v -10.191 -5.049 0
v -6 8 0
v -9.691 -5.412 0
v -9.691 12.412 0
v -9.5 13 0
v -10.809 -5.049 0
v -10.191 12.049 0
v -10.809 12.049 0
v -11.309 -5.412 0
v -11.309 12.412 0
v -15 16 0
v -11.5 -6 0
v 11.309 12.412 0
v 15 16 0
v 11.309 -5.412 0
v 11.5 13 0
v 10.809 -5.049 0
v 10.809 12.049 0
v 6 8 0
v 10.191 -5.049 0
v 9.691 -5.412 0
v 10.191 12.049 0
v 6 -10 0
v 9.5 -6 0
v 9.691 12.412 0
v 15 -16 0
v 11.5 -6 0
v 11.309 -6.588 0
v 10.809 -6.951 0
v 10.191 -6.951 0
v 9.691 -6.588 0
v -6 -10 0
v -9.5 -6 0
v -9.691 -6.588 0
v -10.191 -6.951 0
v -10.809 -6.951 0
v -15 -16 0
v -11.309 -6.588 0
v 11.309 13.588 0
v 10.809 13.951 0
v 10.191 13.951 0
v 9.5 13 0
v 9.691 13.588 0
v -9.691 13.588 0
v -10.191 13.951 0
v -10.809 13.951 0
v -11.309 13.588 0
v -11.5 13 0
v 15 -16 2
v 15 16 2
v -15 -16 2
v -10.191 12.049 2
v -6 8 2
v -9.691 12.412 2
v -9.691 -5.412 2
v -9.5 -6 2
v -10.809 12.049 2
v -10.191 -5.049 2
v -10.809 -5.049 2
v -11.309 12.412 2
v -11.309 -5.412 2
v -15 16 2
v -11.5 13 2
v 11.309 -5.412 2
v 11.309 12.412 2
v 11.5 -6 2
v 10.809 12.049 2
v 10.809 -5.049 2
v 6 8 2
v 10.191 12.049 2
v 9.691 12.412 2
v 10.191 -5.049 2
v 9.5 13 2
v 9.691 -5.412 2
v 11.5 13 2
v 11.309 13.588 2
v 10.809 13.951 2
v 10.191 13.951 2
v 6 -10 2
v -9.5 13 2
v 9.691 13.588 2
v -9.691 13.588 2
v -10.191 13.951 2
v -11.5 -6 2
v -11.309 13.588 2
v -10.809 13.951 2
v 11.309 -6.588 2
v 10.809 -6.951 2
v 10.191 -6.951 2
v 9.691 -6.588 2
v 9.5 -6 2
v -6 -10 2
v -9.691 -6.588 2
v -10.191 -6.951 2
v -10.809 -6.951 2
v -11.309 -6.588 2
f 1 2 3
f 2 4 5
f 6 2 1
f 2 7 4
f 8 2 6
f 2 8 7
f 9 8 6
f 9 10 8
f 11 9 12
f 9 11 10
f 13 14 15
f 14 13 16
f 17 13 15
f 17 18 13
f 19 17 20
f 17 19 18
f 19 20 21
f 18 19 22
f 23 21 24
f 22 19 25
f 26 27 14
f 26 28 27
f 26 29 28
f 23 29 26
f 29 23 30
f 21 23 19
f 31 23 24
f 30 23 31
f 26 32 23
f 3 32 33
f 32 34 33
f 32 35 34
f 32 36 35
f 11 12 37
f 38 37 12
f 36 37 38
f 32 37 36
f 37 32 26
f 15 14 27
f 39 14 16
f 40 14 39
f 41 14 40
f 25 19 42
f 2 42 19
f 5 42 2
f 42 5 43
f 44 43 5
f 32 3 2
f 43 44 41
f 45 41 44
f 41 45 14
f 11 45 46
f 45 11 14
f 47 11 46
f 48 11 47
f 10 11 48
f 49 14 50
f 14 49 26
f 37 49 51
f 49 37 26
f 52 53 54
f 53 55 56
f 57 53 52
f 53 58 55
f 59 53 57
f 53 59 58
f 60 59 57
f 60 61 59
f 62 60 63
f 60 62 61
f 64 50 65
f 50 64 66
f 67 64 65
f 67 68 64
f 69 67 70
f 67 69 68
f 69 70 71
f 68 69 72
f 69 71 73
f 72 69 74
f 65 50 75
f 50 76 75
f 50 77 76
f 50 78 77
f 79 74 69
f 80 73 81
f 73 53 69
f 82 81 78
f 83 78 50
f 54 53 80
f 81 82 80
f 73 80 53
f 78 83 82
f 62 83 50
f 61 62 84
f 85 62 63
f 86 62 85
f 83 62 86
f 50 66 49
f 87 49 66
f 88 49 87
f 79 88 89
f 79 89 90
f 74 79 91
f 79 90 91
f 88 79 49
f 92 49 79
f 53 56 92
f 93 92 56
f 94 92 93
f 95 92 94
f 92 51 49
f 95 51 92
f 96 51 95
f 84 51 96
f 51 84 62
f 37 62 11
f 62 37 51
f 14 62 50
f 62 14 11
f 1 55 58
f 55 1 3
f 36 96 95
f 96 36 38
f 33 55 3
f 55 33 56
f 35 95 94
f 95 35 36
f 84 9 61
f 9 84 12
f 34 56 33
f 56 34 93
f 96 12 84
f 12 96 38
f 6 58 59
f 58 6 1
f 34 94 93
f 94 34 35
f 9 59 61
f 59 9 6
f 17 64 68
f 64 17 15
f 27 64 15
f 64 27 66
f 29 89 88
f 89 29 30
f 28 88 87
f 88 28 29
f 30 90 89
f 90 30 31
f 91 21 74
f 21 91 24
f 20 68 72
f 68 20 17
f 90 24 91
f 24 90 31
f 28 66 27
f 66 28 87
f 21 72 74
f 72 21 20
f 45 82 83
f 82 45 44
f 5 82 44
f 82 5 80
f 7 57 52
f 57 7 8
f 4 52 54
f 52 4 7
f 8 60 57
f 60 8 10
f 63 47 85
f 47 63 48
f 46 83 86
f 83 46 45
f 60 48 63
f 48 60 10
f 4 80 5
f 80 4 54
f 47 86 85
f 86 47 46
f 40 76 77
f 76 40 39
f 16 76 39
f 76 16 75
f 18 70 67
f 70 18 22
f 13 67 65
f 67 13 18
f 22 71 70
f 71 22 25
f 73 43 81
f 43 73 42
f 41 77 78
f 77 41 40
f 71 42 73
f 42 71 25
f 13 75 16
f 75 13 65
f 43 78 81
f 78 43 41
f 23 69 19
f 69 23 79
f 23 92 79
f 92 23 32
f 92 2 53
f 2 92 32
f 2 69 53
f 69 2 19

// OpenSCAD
/*


    Halterung für Raspi-Kamera in Strahlergehäuse

    14.02.2017  Initial version
    17.12.2017  Variante für kleines Gehäuse
    18.12.2017  Anpassungen und Optimierungen (Dicke, Tiefe)
    
    
*/

// Auflösung anpassen
//
$fn = 40;
$fn = 10;

// Welches Modell?
//
zoom=false;

// Materialstärke
//
dicke = 6;

// Parameter für großes Gehäuse
//
//x_size=81;
//y_size=62.5;
x_size=30;
y_size=32;
tiefe = 25;
skala=2;

// Parameter für kleines Gehäuse
//
/*
x_size=59.5;
y_size=40.5;
tiefe = 5;
skala=2;
*/

module Huelse()
{
    linear_extrude(tiefe, scale = skala, center = true)
    {
        offset(0)
        {
            translate([-x_size/2, -y_size/2, 0])
            square([x_size, y_size], 0);
        }
    }
}

module Innenhuelse()
{
    linear_extrude(tiefe, scale = skala, center = true)
    {
        offset(0)
        {
            translate([(-x_size+dicke)/2, (-y_size+dicke)/2, 0])
            square([x_size-dicke, y_size-dicke], 0);
        }
    }
}

//hoehe=-tiefe/2-2;
hoehe=0;

module Box()
{
    translate([-(x_size)/2, -(y_size)/2, hoehe])
    linear_extrude(2)
    {
        offset(0)
        {
            square([x_size, y_size], 0);
        }
    }
}

module Innenbox()
{
    if (!zoom)
    {
        translate([-(12)/2, -10, hoehe])
        linear_extrude(3)
        {
            offset(0)
            {
                square([12, 18], 0);
            }
        }
    }
}

module Zoomloch()
{
    if (zoom)
    {
     translate([-14/2, -1, hoehe])
    
     linear_extrude(3)
     {
         square([14,14]);
     }

     // Linsenbalken
     //
     translate([-23/2, 3.5, hoehe])
    
     linear_extrude(3)
     {
         square([23,5.5]);
     }
    }
}
module Steckerleiste()
{
    // Unteres Loch für die Steckerleiste
    //
    if (zoom)
    {
     translate([-23/2, -10, hoehe])
    
     linear_extrude(3)
     {
         square([23,7]);
     }
    }
}

module Schraubloecher()
{
    // Untere
    //
    if (!zoom)
    {
        translate([-21/2, -6, hoehe])
    
        linear_extrude(3)
        {
            circle(1);
        }

        translate([+21/2, -6, hoehe])
    
        linear_extrude(3)
        {
            circle(1);
        }
    }
    else
    {
        translate([-21/2, -1, hoehe])
    
        linear_extrude(3)
        {
            circle(1);
        }

        translate([+21/2, -1, hoehe])
    
        linear_extrude(3)
        {
            circle(1);
        }
    }
        
    // Obere
    //
    if (!zoom)
    {
        translate([-21/2, 7, hoehe])
        linear_extrude(3)
        {
            circle(1);
        }
    }
    else
    {
        translate([-21/2, 13, hoehe])
        linear_extrude(3)
        {
            circle(1);
        }
    }

    if (!zoom)
    {
        translate([+21/2, 7, hoehe])
        linear_extrude(3)
        {
            circle(1);
        }
    }
    else
    {
        translate([+21/2, 13, hoehe])
        linear_extrude(3)
        {
            circle(1);
        }
    }
}

//difference()
//{
//    Huelse();
//    Innenhuelse();
//}

difference()
{
    Box();
    
        translate([-21/2, -6, hoehe])
    
        linear_extrude(3)
        {
            circle(1);
        }

        translate([+21/2, -6, hoehe])
    
        linear_extrude(3)
        {
            circle(1);
        }

        translate([-21/2, 13, hoehe])
        linear_extrude(3)
        {
            circle(1);
        }

        translate([+21/2, 13, hoehe])
        linear_extrude(3)
        {
            circle(1);
        }

    //Schraubloecher();
    
    //Zoomloch();
    //Steckerleiste();
    
    Innenbox();
}
